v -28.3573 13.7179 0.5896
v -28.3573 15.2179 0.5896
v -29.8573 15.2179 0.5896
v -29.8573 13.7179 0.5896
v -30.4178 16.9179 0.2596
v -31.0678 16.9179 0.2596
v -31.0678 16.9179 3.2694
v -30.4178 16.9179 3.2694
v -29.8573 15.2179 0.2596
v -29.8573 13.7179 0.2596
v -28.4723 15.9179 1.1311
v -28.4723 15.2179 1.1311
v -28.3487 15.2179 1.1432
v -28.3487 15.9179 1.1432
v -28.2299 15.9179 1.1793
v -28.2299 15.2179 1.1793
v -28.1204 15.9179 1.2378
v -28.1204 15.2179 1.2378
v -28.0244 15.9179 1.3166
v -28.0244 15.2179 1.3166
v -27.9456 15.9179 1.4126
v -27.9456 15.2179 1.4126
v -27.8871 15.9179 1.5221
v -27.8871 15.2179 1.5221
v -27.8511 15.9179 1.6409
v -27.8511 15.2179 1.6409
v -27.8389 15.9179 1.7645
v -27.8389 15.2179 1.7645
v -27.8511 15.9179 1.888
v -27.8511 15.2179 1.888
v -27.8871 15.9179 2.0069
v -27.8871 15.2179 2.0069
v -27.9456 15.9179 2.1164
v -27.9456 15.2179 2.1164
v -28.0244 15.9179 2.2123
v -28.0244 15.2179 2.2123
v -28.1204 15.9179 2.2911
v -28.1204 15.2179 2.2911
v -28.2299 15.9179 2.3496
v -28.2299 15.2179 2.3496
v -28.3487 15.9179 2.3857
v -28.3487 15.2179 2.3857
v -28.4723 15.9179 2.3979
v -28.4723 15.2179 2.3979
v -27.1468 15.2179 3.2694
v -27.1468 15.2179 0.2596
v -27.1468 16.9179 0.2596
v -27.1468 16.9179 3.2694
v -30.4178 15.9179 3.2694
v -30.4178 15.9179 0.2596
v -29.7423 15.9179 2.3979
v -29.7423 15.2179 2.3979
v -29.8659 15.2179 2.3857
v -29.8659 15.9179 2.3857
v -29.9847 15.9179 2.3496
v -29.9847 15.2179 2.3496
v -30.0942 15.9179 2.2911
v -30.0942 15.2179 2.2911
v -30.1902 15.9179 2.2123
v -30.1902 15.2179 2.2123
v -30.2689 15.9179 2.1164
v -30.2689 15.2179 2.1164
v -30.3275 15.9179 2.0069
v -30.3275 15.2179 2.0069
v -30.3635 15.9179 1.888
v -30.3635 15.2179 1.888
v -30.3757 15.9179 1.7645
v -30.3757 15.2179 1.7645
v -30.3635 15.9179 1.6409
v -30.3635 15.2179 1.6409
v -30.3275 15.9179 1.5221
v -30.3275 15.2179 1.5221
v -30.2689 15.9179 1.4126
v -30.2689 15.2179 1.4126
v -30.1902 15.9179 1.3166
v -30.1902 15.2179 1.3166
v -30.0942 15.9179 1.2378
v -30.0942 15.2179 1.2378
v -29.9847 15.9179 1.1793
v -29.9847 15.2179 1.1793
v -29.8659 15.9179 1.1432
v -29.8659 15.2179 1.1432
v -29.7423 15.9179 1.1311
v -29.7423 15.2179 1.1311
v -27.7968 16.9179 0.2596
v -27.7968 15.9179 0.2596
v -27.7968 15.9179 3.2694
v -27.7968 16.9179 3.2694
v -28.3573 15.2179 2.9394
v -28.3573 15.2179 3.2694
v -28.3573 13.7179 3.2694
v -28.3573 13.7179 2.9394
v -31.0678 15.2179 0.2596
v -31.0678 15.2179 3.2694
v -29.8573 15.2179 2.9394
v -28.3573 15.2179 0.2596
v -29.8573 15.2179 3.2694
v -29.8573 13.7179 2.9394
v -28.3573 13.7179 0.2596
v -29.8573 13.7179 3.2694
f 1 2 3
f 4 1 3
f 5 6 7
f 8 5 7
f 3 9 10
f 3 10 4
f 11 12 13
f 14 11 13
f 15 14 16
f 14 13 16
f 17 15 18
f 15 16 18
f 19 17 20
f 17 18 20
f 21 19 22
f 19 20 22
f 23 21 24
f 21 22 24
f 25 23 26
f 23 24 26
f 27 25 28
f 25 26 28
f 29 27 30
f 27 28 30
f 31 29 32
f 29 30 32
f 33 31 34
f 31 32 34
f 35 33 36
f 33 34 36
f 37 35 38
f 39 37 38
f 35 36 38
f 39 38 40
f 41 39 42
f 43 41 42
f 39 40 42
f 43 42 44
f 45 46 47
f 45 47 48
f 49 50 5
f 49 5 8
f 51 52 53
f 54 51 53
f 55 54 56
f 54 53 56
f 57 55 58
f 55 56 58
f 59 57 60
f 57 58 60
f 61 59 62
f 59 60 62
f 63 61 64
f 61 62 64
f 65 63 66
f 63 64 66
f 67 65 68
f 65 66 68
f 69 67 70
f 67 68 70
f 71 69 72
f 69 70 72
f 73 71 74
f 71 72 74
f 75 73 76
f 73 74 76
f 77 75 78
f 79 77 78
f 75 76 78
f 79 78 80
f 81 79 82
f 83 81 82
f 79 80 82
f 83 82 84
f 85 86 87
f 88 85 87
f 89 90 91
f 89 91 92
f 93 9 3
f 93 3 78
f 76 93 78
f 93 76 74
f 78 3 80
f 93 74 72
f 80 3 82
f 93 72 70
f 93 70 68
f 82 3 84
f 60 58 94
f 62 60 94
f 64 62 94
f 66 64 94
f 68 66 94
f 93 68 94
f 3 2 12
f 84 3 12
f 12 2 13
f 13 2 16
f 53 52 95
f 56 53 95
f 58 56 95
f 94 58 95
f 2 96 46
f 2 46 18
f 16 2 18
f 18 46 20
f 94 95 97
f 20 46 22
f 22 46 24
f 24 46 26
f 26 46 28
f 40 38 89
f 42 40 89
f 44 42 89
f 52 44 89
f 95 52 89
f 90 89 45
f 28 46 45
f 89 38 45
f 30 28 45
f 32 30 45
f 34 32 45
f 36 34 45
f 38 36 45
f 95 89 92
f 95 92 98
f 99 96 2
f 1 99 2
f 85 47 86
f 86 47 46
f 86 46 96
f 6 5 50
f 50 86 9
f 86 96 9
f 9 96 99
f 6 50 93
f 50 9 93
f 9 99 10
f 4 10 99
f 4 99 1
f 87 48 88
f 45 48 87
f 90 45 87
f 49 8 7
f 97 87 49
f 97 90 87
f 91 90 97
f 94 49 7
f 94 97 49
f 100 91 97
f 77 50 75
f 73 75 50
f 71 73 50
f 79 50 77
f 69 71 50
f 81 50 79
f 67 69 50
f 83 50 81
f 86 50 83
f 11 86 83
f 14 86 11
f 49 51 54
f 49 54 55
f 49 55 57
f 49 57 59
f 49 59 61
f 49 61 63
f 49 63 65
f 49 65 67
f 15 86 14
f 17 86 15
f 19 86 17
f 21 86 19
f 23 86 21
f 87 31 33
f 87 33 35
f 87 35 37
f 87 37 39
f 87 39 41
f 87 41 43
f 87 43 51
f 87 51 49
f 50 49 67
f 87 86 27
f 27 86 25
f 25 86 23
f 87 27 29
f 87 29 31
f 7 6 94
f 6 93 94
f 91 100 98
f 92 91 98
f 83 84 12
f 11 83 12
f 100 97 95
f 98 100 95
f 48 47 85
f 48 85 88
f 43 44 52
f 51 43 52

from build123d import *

# Parameters (mm, degrees)
SKETCH1_W               = 3.0098
SKETCH1_H               = 3.921
BOSS_EXTRUDE1_DEPTH     = 0.7
SKETCH4_W               = 0.33
SKETCH4_H               = 0.75
BOSS_EXTRUDE2_DEPTH     = 1.5
MIRROR9_COPY_1_SKETCH_W = 0.33
MIRROR9_COPY_1_SKETCH_H = 0.75
MIRROR9_COPY_1_DEPTH    = 1.5
SKETCH5_W               = 3.0098
SKETCH5_H               = 0.65
BOSS_EXTRUDE3_DEPTH     = 1


with BuildPart() as part:
    # Sketch1 → Boss-Extrude1 (new body)
    with BuildSketch(Plane.ZX.offset(15.217946538)):
        with Locations((1.764464597, -29.107286197)):
            Rectangle(SKETCH1_W, SKETCH1_H)
        with BuildLine():
            Line((1.131064597, -29.742286197), (1.131064597, -28.472286197))
            ThreePointArc((1.131064597, -28.472286197), (1.764464597, -27.838886197), (2.397864597, -28.472286197))
            Line((2.397864597, -28.472286197), (2.397864597, -29.742286197))
            ThreePointArc((2.397864597, -29.742286197), (1.764464597, -30.375686197), (1.131064597, -29.742286197))
        make_face(mode=Mode.SUBTRACT)
    extrude(amount=BOSS_EXTRUDE1_DEPTH)

    # Sketch4 → Boss-Extrude2 (add)
    with BuildSketch(Plane(origin=(0, 15.217946538, 0), x_dir=(0, 0, -1), z_dir=(0, -1, 0))):
        with Locations((-3.104364597, -28.732286197)):
            Rectangle(SKETCH4_W, SKETCH4_H)
    boss_extrude2 = extrude(amount=BOSS_EXTRUDE2_DEPTH)

    # Mirror8: Boss-Extrude2 across plane
    add(boss_extrude2.mirror(Plane.XY.offset(1.764464597)))

    # Mirror9: Boss-Extrude2 across plane
    add(boss_extrude2.mirror(Plane(origin=(-29.107286197, 13.717946538, 0.589564597), x_dir=(0, 0, 1), z_dir=(1, 0, 0))))

    # Mirror9 copy 1 sketch → Mirror9 copy 1 (add)
    with BuildSketch(Plane(origin=(-58.214572393, 15.217946538, 3.528929194), x_dir=(0, 0, 1), z_dir=(0, -1, 0))):
        with Locations((-3.104364597, -28.732286197)):
            Rectangle(MIRROR9_COPY_1_SKETCH_W, MIRROR9_COPY_1_SKETCH_H)
    extrude(amount=MIRROR9_COPY_1_DEPTH)

    # Sketch5 → Boss-Extrude3 (add)
    with BuildSketch(Plane.ZX.offset(15.917946538)):
        with Locations((1.764464597, -27.471786197)):
            Rectangle(SKETCH5_W, SKETCH5_H)
    boss_extrude3 = extrude(amount=BOSS_EXTRUDE3_DEPTH)

    # Mirror10: Boss-Extrude3 across plane
    add(boss_extrude3.mirror(Plane(origin=(-29.107286197, 0, 0), x_dir=(0, 0, 1), z_dir=(1, 0, 0))))


solid = part.part
